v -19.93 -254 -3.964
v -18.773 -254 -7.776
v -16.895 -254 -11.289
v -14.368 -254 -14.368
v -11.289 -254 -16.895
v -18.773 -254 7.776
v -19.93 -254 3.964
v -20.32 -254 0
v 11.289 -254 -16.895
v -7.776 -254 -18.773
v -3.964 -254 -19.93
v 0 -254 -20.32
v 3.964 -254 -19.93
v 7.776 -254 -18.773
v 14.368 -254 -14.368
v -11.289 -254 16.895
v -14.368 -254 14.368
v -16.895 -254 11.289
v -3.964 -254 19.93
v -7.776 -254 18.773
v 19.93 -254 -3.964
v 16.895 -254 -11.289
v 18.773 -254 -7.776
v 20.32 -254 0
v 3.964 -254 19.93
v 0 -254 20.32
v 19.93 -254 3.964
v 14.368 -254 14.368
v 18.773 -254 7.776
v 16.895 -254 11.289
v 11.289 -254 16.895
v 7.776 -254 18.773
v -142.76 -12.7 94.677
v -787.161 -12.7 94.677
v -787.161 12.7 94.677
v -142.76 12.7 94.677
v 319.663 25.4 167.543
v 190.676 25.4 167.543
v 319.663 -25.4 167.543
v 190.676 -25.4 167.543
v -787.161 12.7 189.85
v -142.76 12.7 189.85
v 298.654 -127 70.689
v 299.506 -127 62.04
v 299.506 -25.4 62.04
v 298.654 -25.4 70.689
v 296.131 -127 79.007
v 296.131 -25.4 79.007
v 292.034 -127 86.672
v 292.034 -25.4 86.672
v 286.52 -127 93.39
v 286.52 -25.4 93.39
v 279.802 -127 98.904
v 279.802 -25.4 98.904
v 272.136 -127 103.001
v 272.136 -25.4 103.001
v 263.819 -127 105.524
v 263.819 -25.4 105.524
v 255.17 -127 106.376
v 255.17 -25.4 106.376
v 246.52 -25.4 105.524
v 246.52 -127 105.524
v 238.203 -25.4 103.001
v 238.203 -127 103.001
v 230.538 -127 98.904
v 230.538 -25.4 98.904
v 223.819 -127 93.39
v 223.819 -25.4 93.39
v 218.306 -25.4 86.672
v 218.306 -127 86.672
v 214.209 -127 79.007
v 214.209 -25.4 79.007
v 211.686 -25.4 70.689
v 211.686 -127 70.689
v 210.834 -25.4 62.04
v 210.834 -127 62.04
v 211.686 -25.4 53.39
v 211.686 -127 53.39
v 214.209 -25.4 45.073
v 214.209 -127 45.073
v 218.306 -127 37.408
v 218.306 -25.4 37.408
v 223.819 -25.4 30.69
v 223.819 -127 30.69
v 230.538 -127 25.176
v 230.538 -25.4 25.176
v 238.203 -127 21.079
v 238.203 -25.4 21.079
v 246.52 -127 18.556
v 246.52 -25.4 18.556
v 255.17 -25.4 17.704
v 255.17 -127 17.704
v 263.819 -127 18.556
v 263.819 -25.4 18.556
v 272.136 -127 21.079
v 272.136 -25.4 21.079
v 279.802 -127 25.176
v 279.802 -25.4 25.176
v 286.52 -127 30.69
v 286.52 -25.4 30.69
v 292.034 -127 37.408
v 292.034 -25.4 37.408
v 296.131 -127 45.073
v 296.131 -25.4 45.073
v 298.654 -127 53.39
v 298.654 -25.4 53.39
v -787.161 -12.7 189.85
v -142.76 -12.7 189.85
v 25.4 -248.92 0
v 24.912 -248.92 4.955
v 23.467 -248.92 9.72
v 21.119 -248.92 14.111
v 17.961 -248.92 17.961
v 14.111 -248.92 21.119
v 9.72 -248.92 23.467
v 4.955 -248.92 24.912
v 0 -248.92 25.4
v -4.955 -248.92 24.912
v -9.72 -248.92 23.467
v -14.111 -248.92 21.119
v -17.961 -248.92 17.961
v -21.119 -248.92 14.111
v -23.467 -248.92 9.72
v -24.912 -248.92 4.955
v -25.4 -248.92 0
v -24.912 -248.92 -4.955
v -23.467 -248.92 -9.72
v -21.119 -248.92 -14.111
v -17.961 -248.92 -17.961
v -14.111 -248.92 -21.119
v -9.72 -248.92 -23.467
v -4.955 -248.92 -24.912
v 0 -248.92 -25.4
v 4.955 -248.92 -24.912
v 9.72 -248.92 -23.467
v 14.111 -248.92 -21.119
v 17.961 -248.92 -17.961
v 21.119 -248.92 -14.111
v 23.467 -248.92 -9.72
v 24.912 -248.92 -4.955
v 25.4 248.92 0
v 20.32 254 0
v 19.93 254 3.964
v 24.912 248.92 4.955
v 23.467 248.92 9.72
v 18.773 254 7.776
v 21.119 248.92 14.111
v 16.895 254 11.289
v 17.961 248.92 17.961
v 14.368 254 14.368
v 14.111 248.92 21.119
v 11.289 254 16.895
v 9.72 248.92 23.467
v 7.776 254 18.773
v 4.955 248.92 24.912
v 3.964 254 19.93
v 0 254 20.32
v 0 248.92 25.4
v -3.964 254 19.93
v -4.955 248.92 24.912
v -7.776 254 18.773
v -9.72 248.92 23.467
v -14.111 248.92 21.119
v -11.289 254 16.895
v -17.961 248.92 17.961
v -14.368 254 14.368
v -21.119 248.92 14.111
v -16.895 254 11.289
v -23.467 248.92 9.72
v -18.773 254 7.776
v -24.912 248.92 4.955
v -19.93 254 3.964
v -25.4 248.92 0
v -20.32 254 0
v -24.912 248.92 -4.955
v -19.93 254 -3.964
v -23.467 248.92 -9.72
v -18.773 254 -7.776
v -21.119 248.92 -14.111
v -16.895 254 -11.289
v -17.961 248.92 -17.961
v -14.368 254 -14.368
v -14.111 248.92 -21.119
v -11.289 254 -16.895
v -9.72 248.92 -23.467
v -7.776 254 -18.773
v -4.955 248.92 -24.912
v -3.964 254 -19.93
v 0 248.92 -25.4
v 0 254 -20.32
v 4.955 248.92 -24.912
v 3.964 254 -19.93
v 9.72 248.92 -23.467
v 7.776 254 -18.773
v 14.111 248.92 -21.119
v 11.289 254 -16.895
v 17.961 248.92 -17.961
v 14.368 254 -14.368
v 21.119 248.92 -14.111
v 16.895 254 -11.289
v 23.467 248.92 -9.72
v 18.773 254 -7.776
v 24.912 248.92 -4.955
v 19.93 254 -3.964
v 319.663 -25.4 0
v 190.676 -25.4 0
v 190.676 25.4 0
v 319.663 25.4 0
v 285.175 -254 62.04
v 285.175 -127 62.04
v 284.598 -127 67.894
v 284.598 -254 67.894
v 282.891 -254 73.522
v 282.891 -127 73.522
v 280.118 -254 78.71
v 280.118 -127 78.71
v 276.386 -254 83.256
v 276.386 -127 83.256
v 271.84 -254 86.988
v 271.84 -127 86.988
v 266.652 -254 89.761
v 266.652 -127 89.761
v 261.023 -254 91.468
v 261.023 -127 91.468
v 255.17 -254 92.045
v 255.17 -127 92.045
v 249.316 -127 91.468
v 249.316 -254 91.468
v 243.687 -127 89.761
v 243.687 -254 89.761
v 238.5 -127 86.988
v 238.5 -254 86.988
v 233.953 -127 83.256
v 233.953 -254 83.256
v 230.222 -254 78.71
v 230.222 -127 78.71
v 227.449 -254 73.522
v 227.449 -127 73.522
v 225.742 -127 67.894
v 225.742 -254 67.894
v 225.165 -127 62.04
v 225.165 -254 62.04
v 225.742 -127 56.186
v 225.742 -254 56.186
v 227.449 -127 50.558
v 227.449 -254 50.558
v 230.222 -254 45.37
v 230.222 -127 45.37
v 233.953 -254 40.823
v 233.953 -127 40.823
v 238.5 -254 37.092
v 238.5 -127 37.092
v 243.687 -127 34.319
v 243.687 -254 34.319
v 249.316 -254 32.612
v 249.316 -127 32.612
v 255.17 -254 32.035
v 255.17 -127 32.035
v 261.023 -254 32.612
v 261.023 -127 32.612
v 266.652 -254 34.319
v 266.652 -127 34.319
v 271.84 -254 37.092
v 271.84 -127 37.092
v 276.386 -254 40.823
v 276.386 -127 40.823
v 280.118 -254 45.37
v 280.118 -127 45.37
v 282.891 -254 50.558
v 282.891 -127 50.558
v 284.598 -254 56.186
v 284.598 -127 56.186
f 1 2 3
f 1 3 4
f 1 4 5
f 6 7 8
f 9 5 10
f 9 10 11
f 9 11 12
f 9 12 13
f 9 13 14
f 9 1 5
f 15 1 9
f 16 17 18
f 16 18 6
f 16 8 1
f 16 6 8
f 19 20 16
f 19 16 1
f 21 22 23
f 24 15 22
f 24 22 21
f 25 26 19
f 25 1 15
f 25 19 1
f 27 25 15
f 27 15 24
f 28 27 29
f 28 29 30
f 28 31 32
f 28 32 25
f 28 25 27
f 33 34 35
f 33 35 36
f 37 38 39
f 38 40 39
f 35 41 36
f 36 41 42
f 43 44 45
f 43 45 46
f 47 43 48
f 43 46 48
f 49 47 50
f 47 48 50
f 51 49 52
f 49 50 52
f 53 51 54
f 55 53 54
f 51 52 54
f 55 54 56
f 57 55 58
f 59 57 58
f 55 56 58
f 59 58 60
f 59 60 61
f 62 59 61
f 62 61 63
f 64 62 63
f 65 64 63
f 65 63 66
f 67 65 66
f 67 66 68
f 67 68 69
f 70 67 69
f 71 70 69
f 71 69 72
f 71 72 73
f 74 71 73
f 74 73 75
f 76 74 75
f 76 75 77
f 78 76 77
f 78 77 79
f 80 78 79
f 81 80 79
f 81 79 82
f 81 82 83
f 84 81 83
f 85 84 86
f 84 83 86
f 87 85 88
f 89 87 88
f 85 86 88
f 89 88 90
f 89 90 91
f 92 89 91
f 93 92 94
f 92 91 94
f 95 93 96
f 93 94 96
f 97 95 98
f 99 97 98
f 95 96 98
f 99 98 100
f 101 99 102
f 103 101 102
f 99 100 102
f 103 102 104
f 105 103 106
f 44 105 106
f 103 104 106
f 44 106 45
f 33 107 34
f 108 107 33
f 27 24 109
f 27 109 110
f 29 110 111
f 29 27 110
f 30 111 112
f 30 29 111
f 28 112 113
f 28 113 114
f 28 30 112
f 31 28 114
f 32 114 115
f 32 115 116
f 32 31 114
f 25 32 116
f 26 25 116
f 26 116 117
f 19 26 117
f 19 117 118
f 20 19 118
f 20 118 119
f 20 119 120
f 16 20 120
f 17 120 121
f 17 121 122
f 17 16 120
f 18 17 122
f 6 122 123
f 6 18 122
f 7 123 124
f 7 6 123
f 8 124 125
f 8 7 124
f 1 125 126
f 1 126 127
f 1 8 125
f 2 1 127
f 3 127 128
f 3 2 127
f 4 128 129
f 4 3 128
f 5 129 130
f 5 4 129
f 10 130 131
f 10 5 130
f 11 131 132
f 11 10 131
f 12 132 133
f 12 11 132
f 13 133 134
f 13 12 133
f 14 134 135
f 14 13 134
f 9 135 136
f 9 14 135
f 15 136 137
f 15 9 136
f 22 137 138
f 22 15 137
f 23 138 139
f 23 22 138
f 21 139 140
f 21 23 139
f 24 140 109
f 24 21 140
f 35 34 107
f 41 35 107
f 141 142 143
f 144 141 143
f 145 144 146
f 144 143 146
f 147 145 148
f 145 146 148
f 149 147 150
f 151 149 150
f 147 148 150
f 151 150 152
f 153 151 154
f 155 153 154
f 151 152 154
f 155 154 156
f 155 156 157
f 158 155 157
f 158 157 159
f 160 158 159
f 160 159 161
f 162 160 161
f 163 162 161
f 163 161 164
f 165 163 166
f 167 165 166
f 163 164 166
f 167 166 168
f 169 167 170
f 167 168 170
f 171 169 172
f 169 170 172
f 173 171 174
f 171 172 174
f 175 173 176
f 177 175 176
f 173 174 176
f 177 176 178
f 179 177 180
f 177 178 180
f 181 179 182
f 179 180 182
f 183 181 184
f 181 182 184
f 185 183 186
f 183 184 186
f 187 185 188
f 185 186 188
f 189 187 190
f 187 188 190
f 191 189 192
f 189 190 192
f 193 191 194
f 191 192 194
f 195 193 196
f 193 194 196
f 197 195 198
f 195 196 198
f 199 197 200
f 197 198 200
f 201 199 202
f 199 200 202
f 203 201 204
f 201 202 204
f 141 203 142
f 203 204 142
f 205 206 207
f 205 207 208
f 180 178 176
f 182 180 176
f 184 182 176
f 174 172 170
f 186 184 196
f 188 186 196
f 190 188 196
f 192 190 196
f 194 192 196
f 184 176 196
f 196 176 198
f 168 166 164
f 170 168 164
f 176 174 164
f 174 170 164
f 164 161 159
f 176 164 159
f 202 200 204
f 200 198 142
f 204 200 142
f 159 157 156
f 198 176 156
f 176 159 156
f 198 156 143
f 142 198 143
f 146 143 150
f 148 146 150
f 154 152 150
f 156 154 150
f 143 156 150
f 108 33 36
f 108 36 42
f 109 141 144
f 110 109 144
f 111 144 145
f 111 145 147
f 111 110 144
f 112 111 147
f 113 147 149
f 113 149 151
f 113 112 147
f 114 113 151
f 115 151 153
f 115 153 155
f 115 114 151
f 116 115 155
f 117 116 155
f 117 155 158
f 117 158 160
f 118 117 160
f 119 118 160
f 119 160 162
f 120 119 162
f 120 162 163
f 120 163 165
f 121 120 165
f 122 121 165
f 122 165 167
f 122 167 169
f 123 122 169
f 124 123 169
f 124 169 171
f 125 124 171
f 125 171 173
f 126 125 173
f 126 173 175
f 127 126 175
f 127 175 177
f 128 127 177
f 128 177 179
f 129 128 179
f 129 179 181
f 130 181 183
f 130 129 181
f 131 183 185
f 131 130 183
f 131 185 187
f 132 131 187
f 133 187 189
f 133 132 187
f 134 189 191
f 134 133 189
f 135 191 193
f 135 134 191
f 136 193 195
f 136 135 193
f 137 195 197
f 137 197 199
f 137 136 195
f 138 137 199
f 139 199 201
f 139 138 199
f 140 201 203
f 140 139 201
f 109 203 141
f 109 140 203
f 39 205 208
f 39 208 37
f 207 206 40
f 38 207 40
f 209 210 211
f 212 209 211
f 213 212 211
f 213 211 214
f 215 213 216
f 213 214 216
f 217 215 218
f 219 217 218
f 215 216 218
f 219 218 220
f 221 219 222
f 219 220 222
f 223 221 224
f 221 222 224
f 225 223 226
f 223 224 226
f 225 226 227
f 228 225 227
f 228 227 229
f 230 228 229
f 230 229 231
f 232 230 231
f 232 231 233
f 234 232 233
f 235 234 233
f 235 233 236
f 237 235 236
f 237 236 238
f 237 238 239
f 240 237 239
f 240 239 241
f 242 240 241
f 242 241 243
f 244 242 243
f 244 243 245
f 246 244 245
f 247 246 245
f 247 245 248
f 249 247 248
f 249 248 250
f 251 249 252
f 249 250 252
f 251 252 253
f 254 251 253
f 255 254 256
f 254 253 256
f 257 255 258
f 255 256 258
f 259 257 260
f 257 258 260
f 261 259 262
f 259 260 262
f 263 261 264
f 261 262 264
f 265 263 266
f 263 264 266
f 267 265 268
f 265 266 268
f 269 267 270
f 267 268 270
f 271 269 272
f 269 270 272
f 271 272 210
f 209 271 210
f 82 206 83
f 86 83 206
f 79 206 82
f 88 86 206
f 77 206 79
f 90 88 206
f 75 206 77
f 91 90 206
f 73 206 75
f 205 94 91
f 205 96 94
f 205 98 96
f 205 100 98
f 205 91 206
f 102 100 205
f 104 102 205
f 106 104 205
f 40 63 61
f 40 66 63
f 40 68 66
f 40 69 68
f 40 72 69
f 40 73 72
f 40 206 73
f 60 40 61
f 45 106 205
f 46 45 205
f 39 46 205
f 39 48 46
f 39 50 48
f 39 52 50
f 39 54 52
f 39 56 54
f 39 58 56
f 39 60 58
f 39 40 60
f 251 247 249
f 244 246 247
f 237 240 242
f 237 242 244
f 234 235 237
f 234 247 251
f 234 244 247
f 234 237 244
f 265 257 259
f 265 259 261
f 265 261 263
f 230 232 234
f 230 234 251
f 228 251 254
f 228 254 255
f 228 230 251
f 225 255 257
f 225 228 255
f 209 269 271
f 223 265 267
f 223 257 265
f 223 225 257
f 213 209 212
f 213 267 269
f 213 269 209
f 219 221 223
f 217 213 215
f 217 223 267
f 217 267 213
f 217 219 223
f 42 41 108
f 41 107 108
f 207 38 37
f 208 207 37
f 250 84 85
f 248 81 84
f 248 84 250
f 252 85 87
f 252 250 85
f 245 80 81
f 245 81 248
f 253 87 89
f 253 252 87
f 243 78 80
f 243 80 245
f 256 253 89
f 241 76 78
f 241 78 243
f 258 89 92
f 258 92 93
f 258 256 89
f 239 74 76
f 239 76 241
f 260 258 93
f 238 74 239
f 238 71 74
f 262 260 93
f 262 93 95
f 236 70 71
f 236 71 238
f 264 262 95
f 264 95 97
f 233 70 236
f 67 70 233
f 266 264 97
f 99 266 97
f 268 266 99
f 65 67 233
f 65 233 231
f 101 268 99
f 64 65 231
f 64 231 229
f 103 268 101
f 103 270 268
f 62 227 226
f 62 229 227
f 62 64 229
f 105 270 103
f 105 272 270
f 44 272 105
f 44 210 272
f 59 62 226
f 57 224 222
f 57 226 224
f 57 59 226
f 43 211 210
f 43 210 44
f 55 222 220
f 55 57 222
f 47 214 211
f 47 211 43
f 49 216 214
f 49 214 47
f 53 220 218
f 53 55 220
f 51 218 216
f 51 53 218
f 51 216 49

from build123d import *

# Parameters (mm, degrees)
F0_R          = 25.4
F1_DEPTH      = 254
F2_SIZE       = 5.08
F3_W          = 128.986925
F3_H          = 167.5428
F3_R          = 44.336129
F4_DEPTH      = 25.4
F3_R_2        = 30.00479
F5_DEPTH      = 127
F5_DEPTH_BACK = 25.4
F6_DEPTH      = 254
F6_DEPTH_BACK = 25.4
F7_W          = 644.401014
F7_H          = 95.173076
F8_DEPTH      = 12.7


with BuildPart() as f1:
    # F0 (on Front) → F1 (new body, symmetric)
    with BuildSketch(Plane.XZ):
        Circle(F0_R)
    extrude(amount=F1_DEPTH, both=True)

    # F2
    f2_edges = [f1.edges().sort_by_distance(p)[0] for p in [
        (-25.4, 254, 0),
        (-25.4, -254, 0),
    ]]
    chamfer(f2_edges, length=F2_SIZE)


with BuildPart() as f4:
    # F3 (on Front) → F4 (new body, symmetric)
    with BuildSketch(Plane.XZ):
        with Locations((255.169779, 83.7714)):
            Rectangle(F3_W, F3_H)
        with Locations((255.169779, 62.039908)):
            Circle(F3_R, mode=Mode.SUBTRACT)
    extrude(amount=F4_DEPTH, both=True)

    # F3 (on Front) → F5 (join, two sides)
    with BuildSketch(Plane.XZ) as f5_sk:
        with Locations((255.169779, 62.039908)):
            Circle(F3_R)
        with Locations((255.169779, 62.039908)):
            Circle(F3_R_2, mode=Mode.SUBTRACT)
    extrude(amount=F5_DEPTH)
    extrude(f5_sk.sketch, amount=-F5_DEPTH_BACK)

    # F3 (on Front) → F6 (join, two sides)
    with BuildSketch(Plane.XZ) as f6_sk:
        with Locations((255.169779, 62.039908)):
            Circle(F3_R_2)
    extrude(amount=F6_DEPTH)
    extrude(f6_sk.sketch, amount=-F6_DEPTH_BACK)


with BuildPart() as f8:
    # F7 (on Front) → F8 (new body, symmetric)
    with BuildSketch(Plane.XZ):
        with Locations((-464.960128, 142.263919)):
            Rectangle(F7_W, F7_H)
    extrude(amount=F8_DEPTH, both=True)


solid = Compound([f1.part, f4.part, f8.part])
